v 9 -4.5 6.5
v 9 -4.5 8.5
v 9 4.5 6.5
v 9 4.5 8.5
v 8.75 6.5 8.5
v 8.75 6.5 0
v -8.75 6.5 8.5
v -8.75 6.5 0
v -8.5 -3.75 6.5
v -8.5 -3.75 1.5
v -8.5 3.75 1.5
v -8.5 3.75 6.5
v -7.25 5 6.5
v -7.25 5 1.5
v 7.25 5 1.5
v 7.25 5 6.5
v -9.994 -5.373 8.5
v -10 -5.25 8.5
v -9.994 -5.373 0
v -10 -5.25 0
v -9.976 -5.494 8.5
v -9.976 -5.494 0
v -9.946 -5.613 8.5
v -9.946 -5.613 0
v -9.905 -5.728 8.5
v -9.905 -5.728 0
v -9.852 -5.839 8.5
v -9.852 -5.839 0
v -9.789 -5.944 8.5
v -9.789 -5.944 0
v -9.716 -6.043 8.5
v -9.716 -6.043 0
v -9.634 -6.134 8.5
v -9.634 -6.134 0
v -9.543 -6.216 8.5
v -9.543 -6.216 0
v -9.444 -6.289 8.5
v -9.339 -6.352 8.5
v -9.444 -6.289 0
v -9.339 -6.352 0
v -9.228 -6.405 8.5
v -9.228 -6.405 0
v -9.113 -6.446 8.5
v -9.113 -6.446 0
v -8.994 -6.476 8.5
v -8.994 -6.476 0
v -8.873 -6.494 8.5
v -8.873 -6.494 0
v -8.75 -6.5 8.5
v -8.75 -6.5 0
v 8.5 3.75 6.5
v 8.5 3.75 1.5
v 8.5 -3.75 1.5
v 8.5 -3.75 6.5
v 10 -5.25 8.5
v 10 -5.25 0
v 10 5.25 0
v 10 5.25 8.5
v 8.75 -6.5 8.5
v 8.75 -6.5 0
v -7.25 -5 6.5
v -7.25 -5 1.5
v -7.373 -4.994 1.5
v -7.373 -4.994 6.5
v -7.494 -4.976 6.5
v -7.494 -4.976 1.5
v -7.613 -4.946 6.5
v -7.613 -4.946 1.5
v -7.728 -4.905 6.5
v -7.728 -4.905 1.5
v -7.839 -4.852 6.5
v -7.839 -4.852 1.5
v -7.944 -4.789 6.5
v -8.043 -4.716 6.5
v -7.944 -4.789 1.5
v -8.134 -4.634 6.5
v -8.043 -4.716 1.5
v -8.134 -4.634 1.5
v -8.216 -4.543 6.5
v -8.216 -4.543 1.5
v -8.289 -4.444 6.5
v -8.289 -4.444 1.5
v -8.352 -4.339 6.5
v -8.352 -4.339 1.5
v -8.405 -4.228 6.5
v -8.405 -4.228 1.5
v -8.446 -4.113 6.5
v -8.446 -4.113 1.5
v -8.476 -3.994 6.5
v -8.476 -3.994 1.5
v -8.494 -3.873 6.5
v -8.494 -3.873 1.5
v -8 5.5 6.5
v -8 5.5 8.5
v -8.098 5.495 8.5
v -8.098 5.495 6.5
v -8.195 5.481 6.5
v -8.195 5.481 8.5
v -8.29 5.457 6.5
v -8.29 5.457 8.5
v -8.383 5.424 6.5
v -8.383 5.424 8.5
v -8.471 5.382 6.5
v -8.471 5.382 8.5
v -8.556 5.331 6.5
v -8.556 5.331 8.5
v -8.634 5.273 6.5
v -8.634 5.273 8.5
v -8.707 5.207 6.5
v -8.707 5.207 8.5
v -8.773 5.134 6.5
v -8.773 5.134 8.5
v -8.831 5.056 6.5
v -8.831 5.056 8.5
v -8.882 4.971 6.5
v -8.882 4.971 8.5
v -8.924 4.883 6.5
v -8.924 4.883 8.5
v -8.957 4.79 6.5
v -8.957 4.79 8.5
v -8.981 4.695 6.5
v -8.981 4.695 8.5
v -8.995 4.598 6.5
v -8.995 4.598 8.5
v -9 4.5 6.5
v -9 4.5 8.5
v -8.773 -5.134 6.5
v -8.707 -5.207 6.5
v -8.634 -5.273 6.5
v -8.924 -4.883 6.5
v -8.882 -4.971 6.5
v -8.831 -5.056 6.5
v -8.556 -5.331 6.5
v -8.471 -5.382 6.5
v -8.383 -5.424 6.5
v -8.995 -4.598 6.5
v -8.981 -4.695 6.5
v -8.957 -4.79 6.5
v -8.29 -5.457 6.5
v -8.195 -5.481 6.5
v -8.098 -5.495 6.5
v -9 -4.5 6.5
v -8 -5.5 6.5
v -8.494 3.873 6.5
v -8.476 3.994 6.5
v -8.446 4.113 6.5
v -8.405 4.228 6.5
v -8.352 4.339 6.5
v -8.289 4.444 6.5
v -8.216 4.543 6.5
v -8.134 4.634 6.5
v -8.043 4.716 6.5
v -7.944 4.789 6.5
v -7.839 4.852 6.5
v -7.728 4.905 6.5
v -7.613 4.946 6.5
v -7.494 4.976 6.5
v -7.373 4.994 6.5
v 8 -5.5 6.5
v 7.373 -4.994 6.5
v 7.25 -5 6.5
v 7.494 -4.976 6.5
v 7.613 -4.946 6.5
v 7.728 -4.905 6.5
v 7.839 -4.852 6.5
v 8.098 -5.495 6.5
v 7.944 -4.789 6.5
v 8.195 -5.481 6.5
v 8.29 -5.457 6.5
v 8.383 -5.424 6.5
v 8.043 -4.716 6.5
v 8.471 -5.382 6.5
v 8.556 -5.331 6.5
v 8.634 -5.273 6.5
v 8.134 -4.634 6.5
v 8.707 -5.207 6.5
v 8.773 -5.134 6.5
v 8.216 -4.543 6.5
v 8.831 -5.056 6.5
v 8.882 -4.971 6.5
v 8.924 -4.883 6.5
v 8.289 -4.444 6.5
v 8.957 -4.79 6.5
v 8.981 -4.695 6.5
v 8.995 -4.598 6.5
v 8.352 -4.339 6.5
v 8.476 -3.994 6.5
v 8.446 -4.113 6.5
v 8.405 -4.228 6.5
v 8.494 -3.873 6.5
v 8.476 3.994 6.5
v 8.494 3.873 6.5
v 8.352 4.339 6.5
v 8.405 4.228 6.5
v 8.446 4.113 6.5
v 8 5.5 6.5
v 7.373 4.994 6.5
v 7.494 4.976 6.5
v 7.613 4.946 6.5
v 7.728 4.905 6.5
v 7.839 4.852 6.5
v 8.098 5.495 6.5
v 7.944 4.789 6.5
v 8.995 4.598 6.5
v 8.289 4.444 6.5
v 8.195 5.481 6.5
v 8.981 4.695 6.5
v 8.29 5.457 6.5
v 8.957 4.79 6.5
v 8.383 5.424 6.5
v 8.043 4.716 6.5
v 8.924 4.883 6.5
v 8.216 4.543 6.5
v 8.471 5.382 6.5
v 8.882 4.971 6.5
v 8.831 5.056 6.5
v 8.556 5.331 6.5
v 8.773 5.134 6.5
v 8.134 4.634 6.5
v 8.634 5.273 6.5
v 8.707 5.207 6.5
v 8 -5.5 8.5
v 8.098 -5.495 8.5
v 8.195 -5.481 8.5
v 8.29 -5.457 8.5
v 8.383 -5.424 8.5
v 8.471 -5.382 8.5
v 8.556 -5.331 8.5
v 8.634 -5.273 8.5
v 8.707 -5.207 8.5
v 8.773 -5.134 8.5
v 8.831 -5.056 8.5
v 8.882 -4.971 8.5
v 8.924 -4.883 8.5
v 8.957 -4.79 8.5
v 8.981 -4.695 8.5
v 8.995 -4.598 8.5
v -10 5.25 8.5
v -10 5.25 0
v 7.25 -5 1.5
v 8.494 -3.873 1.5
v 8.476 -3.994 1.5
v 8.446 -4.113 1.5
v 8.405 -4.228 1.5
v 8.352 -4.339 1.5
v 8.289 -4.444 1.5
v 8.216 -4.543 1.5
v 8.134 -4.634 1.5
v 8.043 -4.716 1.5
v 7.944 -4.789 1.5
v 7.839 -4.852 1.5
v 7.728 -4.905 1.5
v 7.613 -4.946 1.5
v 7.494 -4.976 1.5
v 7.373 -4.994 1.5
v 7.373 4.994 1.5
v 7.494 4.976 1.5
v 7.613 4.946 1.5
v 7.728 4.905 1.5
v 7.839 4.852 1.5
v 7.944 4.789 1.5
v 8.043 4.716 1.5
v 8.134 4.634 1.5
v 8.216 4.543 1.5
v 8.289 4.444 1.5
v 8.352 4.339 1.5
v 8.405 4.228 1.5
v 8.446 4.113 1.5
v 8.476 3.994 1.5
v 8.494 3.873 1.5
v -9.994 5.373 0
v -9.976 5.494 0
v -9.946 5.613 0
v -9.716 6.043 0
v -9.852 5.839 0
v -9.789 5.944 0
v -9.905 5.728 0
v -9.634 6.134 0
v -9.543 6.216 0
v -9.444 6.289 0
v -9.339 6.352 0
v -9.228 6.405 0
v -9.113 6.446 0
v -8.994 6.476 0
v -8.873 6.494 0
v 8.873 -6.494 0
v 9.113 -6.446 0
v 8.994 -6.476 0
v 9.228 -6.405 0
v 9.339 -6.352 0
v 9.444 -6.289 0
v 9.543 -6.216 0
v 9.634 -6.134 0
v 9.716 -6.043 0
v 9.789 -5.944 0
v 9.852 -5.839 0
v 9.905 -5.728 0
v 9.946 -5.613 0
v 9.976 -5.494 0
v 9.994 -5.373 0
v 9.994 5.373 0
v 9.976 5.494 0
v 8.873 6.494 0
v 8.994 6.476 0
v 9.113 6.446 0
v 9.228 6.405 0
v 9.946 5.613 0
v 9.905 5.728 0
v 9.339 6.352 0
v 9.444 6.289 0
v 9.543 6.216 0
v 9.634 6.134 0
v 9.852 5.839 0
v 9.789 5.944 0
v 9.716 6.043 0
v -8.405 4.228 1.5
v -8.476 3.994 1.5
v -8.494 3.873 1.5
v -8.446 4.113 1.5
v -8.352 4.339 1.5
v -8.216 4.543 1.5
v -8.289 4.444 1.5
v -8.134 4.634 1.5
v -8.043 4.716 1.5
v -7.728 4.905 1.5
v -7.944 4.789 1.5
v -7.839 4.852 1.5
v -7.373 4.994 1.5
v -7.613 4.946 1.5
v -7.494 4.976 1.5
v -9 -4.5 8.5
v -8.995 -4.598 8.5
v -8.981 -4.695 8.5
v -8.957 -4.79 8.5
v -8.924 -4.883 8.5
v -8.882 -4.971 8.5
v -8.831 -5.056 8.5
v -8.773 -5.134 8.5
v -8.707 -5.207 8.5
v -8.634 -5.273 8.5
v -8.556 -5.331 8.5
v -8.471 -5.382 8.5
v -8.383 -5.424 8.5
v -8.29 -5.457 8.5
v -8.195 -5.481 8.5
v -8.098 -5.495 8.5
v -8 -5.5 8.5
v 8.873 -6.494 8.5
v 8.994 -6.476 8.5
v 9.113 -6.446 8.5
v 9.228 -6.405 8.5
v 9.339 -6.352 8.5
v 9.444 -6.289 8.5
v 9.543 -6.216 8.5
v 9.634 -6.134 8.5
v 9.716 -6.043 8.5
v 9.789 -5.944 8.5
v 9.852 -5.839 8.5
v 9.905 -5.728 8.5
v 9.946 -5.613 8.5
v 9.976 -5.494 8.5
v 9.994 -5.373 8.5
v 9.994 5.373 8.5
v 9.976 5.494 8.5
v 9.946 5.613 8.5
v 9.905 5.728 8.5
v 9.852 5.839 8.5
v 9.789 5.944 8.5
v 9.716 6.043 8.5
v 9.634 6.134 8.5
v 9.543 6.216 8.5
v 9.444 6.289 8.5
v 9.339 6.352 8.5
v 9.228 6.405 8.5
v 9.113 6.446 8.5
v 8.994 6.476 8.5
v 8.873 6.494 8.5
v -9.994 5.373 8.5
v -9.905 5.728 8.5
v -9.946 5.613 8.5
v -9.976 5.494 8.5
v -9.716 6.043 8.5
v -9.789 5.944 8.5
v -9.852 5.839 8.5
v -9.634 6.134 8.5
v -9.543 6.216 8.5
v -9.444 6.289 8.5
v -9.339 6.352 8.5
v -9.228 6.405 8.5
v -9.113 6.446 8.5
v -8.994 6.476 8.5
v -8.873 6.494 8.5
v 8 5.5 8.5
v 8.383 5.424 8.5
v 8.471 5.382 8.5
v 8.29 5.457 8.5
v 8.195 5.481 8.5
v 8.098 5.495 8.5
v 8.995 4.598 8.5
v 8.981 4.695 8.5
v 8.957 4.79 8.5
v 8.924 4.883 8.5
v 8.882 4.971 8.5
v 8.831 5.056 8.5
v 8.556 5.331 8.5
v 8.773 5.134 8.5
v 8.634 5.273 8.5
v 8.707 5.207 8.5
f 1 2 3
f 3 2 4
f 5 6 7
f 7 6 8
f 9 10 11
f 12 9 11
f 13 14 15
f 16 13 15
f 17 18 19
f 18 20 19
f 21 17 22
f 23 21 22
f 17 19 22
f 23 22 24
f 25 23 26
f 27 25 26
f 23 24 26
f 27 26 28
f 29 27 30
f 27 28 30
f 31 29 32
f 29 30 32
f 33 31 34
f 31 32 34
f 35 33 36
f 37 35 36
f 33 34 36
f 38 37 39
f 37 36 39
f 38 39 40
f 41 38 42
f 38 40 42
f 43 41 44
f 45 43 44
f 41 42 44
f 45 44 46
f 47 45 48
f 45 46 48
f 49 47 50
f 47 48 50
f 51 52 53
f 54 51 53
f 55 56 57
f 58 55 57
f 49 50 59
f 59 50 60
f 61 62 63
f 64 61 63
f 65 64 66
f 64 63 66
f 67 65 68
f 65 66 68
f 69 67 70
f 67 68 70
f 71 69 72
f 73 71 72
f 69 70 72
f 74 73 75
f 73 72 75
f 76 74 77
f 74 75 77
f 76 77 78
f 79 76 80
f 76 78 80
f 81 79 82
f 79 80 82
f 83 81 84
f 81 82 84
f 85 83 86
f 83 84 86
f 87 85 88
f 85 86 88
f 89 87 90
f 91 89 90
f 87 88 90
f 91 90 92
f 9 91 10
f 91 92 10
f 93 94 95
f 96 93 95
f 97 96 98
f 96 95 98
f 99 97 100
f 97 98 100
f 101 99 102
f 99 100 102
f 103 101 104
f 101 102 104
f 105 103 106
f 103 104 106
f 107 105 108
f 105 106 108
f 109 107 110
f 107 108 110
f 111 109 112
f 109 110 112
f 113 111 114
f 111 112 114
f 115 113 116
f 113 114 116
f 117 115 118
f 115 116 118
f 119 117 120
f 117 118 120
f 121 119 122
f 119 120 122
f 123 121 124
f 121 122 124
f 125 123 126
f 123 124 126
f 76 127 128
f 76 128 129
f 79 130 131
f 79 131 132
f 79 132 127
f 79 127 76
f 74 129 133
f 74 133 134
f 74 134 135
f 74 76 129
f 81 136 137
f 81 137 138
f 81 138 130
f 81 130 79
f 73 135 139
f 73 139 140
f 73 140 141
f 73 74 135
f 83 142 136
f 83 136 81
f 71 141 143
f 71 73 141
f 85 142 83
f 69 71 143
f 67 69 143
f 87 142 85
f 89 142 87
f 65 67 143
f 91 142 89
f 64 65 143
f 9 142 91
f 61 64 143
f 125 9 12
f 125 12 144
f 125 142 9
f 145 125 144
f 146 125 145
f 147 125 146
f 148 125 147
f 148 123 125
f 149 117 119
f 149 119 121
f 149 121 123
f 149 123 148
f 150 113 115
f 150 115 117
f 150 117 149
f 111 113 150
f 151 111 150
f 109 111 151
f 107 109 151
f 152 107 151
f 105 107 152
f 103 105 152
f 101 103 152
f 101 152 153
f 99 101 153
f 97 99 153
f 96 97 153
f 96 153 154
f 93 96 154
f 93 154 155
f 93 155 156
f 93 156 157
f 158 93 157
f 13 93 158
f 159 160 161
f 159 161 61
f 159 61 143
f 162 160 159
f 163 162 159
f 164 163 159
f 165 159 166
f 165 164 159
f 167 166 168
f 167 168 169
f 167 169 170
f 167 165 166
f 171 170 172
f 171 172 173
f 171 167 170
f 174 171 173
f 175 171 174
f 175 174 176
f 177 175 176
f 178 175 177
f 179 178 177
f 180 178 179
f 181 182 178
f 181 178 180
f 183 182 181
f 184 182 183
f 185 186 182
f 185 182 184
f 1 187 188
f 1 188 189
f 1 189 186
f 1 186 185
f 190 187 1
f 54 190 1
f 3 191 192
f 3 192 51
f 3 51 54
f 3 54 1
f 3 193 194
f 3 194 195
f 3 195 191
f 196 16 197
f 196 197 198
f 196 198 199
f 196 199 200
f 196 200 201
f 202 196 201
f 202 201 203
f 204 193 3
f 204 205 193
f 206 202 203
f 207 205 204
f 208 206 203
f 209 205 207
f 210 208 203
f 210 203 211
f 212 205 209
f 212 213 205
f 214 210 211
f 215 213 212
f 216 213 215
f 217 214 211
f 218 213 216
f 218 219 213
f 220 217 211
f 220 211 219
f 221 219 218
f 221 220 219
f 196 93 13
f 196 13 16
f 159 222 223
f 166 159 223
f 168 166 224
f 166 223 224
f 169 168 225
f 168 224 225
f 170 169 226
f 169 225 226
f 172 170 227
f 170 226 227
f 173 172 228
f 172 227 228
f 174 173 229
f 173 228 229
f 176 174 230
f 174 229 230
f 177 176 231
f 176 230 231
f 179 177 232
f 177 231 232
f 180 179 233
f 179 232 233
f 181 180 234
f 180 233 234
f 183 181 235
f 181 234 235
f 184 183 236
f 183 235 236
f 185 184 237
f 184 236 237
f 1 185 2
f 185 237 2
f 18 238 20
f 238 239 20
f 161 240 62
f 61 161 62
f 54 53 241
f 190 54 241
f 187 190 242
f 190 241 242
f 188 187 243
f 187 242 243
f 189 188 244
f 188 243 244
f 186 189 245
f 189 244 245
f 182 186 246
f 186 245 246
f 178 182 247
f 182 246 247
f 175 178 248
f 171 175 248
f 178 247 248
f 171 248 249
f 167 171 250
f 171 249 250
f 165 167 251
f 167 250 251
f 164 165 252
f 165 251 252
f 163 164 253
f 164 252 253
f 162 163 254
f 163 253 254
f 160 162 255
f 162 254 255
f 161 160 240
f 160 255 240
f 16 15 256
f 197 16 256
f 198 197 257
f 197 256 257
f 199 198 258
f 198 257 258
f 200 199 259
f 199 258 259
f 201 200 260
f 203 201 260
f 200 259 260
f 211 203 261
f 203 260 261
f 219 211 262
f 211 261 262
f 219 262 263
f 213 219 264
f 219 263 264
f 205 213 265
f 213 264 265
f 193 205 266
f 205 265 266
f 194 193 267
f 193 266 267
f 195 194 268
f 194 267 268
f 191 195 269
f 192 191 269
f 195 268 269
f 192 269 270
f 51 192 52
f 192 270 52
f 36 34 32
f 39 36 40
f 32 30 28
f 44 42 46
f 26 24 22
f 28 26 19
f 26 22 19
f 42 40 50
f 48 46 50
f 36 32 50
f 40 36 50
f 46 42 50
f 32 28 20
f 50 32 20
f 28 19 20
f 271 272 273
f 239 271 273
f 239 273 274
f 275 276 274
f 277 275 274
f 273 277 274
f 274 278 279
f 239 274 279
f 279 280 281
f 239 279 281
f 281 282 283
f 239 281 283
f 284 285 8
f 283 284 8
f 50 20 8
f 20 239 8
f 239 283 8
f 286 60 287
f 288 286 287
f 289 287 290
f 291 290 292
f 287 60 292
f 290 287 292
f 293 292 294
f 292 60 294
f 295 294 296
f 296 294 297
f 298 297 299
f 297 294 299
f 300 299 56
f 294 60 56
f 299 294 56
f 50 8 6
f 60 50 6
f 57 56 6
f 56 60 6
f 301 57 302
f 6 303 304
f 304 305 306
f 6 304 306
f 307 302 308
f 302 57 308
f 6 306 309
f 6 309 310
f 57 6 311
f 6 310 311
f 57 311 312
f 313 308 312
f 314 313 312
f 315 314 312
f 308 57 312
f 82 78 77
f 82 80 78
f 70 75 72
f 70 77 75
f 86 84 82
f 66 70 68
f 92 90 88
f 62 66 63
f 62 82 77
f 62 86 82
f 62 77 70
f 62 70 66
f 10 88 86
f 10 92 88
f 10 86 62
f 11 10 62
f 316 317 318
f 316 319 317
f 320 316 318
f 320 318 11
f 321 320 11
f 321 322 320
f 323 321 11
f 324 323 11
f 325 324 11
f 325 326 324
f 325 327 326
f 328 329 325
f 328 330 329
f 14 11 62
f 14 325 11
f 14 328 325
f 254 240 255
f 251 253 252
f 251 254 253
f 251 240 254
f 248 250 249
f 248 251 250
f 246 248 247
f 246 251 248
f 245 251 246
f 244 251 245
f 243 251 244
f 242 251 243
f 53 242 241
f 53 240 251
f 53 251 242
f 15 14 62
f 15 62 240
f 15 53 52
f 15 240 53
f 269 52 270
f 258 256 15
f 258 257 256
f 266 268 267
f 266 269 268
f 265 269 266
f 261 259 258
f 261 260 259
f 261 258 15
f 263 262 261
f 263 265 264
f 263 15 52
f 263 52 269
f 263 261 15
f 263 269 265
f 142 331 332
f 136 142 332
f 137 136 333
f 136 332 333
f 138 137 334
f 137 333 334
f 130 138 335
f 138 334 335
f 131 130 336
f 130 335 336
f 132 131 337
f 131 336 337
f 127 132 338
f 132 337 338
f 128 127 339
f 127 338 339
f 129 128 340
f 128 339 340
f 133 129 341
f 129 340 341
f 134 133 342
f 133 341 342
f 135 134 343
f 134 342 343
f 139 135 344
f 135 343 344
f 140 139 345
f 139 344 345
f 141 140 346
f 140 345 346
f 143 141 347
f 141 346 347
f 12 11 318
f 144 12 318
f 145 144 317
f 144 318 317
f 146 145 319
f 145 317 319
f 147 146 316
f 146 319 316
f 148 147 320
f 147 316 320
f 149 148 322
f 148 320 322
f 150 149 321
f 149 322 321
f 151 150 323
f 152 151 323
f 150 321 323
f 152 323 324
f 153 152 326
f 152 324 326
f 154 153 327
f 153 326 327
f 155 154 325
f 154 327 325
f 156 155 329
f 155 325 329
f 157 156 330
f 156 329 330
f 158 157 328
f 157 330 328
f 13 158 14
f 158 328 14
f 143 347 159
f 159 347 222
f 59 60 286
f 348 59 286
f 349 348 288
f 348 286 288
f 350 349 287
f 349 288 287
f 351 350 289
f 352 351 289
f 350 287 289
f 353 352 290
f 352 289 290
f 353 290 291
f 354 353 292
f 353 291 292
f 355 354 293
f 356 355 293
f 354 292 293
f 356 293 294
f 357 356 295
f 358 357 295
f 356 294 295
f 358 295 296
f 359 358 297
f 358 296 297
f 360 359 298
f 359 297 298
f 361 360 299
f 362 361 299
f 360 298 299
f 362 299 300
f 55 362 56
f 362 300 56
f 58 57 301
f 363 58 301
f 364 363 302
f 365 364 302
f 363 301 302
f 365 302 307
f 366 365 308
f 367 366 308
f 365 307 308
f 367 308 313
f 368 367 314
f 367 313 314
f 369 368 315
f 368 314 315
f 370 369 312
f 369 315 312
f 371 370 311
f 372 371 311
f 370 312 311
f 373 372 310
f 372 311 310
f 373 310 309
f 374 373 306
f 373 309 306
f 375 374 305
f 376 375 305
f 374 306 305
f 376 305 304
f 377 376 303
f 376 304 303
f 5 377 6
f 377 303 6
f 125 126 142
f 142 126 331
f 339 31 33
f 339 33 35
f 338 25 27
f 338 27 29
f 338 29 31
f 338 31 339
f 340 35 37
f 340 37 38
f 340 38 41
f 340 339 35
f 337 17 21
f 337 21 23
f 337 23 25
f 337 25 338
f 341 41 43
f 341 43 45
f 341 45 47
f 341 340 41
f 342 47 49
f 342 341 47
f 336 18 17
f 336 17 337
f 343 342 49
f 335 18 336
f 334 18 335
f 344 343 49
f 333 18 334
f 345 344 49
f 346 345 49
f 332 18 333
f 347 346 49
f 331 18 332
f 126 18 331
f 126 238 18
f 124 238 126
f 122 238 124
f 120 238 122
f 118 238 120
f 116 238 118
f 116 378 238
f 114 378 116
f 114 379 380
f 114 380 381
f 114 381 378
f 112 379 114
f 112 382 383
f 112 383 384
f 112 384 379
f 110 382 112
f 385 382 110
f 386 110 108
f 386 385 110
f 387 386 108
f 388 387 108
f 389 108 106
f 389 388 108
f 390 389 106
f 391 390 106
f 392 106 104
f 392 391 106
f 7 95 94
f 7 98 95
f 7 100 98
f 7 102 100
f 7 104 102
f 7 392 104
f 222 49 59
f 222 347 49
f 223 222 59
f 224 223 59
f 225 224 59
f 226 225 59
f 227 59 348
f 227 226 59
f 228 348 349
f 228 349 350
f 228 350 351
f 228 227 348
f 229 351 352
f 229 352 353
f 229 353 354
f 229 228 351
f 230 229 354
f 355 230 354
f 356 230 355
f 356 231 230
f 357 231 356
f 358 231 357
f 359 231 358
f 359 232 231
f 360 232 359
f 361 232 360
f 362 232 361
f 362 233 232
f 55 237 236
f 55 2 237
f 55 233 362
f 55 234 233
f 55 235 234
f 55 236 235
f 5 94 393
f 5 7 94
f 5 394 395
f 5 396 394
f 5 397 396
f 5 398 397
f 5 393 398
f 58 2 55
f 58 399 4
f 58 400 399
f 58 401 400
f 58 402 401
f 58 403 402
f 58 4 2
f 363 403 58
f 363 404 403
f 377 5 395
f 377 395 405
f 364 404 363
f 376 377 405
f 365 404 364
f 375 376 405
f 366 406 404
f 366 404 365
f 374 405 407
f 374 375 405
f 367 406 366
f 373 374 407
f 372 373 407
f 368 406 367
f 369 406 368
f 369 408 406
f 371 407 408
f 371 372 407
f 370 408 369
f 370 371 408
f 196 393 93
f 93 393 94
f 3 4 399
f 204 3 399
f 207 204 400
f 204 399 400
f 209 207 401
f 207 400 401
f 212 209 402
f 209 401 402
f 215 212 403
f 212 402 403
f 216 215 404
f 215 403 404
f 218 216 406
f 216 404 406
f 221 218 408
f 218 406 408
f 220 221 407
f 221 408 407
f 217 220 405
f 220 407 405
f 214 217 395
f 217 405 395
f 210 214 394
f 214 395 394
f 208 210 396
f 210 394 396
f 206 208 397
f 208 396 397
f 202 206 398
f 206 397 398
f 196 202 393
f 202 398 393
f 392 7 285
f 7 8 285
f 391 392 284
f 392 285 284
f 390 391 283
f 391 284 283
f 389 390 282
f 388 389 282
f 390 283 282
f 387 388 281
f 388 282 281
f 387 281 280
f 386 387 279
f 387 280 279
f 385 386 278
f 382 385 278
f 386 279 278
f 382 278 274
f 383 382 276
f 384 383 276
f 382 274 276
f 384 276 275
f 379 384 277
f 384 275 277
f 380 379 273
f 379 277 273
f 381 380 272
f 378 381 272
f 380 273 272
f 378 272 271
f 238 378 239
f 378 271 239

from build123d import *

# Parameters (mm, degrees)
F1_DEPTH = 1.5
F3_DEPTH = 7
F5_DEPTH = 2


with BuildPart() as f1:
    # F0 (on Top) → F1 (new body)
    with BuildSketch(Plane.XY):
        with BuildLine():
            Line((8.75, 6.5), (-8.75, 6.5))
            ThreePointArc((-8.75, 6.5), (-9.633883, 6.133883), (-10, 5.25))
            Line((-10, 5.25), (-10, -5.25))
            ThreePointArc((-10, -5.25), (-9.633883, -6.133883), (-8.75, -6.5))
            Line((-8.75, -6.5), (8.75, -6.5))
            ThreePointArc((8.75, -6.5), (9.633883, -6.133883), (10, -5.25))
            Line((10, -5.25), (10, 5.25))
            ThreePointArc((10, 5.25), (9.633883, 6.133883), (8.75, 6.5))
        make_face()
    extrude(amount=F1_DEPTH)

    # F2 (on face) → F3 (join)
    with BuildSketch(Plane.XY.offset(1.5)):
        with BuildLine():
            ThreePointArc((10, 5.25), (9.633883, 6.133883), (8.75, 6.5))
            Line((8.75, 6.5), (-8.75, 6.5))
            ThreePointArc((-8.75, 6.5), (-9.633883, 6.133883), (-10, 5.25))
            Line((-10, 5.25), (-10, -5.25))
            ThreePointArc((-10, -5.25), (-9.633883, -6.133883), (-8.75, -6.5))
            Line((-8.75, -6.5), (8.75, -6.5))
            ThreePointArc((8.75, -6.5), (9.633883, -6.133883), (10, -5.25))
            Line((10, -5.25), (10, 5.25))
        make_face()
        with BuildLine():
            ThreePointArc((-8.5, 3.75), (-8.133883, 4.633883), (-7.25, 5))
            Line((-7.25, 5), (7.25, 5))
            ThreePointArc((7.25, 5), (8.133883, 4.633883), (8.5, 3.75))
            Line((8.5, 3.75), (8.5, -3.75))
            ThreePointArc((8.5, -3.75), (8.133883, -4.633883), (7.25, -5))
            Line((7.25, -5), (-7.25, -5))
            ThreePointArc((-7.25, -5), (-8.133883, -4.633883), (-8.5, -3.75))
            Line((-8.5, -3.75), (-8.5, 3.75))
        make_face(mode=Mode.SUBTRACT)
    extrude(amount=F3_DEPTH)

    # F4 (on face) → F5 (cut)
    with BuildSketch(Plane.XY.offset(8.5)):
        with BuildLine():
            Line((8, 5.5), (-8, 5.5))
            ThreePointArc((-8, 5.5), (-8.707107, 5.207107), (-9, 4.5))
            Line((-9, 4.5), (-9, -4.5))
            ThreePointArc((-9, -4.5), (-8.707107, -5.207107), (-8, -5.5))
            Line((-8, -5.5), (8, -5.5))
            ThreePointArc((8, -5.5), (8.707107, -5.207107), (9, -4.5))
            Line((9, -4.5), (9, 4.5))
            ThreePointArc((9, 4.5), (8.707107, 5.207107), (8, 5.5))
        make_face()
    extrude(amount=-F5_DEPTH, mode=Mode.SUBTRACT)


solid = f1.part
